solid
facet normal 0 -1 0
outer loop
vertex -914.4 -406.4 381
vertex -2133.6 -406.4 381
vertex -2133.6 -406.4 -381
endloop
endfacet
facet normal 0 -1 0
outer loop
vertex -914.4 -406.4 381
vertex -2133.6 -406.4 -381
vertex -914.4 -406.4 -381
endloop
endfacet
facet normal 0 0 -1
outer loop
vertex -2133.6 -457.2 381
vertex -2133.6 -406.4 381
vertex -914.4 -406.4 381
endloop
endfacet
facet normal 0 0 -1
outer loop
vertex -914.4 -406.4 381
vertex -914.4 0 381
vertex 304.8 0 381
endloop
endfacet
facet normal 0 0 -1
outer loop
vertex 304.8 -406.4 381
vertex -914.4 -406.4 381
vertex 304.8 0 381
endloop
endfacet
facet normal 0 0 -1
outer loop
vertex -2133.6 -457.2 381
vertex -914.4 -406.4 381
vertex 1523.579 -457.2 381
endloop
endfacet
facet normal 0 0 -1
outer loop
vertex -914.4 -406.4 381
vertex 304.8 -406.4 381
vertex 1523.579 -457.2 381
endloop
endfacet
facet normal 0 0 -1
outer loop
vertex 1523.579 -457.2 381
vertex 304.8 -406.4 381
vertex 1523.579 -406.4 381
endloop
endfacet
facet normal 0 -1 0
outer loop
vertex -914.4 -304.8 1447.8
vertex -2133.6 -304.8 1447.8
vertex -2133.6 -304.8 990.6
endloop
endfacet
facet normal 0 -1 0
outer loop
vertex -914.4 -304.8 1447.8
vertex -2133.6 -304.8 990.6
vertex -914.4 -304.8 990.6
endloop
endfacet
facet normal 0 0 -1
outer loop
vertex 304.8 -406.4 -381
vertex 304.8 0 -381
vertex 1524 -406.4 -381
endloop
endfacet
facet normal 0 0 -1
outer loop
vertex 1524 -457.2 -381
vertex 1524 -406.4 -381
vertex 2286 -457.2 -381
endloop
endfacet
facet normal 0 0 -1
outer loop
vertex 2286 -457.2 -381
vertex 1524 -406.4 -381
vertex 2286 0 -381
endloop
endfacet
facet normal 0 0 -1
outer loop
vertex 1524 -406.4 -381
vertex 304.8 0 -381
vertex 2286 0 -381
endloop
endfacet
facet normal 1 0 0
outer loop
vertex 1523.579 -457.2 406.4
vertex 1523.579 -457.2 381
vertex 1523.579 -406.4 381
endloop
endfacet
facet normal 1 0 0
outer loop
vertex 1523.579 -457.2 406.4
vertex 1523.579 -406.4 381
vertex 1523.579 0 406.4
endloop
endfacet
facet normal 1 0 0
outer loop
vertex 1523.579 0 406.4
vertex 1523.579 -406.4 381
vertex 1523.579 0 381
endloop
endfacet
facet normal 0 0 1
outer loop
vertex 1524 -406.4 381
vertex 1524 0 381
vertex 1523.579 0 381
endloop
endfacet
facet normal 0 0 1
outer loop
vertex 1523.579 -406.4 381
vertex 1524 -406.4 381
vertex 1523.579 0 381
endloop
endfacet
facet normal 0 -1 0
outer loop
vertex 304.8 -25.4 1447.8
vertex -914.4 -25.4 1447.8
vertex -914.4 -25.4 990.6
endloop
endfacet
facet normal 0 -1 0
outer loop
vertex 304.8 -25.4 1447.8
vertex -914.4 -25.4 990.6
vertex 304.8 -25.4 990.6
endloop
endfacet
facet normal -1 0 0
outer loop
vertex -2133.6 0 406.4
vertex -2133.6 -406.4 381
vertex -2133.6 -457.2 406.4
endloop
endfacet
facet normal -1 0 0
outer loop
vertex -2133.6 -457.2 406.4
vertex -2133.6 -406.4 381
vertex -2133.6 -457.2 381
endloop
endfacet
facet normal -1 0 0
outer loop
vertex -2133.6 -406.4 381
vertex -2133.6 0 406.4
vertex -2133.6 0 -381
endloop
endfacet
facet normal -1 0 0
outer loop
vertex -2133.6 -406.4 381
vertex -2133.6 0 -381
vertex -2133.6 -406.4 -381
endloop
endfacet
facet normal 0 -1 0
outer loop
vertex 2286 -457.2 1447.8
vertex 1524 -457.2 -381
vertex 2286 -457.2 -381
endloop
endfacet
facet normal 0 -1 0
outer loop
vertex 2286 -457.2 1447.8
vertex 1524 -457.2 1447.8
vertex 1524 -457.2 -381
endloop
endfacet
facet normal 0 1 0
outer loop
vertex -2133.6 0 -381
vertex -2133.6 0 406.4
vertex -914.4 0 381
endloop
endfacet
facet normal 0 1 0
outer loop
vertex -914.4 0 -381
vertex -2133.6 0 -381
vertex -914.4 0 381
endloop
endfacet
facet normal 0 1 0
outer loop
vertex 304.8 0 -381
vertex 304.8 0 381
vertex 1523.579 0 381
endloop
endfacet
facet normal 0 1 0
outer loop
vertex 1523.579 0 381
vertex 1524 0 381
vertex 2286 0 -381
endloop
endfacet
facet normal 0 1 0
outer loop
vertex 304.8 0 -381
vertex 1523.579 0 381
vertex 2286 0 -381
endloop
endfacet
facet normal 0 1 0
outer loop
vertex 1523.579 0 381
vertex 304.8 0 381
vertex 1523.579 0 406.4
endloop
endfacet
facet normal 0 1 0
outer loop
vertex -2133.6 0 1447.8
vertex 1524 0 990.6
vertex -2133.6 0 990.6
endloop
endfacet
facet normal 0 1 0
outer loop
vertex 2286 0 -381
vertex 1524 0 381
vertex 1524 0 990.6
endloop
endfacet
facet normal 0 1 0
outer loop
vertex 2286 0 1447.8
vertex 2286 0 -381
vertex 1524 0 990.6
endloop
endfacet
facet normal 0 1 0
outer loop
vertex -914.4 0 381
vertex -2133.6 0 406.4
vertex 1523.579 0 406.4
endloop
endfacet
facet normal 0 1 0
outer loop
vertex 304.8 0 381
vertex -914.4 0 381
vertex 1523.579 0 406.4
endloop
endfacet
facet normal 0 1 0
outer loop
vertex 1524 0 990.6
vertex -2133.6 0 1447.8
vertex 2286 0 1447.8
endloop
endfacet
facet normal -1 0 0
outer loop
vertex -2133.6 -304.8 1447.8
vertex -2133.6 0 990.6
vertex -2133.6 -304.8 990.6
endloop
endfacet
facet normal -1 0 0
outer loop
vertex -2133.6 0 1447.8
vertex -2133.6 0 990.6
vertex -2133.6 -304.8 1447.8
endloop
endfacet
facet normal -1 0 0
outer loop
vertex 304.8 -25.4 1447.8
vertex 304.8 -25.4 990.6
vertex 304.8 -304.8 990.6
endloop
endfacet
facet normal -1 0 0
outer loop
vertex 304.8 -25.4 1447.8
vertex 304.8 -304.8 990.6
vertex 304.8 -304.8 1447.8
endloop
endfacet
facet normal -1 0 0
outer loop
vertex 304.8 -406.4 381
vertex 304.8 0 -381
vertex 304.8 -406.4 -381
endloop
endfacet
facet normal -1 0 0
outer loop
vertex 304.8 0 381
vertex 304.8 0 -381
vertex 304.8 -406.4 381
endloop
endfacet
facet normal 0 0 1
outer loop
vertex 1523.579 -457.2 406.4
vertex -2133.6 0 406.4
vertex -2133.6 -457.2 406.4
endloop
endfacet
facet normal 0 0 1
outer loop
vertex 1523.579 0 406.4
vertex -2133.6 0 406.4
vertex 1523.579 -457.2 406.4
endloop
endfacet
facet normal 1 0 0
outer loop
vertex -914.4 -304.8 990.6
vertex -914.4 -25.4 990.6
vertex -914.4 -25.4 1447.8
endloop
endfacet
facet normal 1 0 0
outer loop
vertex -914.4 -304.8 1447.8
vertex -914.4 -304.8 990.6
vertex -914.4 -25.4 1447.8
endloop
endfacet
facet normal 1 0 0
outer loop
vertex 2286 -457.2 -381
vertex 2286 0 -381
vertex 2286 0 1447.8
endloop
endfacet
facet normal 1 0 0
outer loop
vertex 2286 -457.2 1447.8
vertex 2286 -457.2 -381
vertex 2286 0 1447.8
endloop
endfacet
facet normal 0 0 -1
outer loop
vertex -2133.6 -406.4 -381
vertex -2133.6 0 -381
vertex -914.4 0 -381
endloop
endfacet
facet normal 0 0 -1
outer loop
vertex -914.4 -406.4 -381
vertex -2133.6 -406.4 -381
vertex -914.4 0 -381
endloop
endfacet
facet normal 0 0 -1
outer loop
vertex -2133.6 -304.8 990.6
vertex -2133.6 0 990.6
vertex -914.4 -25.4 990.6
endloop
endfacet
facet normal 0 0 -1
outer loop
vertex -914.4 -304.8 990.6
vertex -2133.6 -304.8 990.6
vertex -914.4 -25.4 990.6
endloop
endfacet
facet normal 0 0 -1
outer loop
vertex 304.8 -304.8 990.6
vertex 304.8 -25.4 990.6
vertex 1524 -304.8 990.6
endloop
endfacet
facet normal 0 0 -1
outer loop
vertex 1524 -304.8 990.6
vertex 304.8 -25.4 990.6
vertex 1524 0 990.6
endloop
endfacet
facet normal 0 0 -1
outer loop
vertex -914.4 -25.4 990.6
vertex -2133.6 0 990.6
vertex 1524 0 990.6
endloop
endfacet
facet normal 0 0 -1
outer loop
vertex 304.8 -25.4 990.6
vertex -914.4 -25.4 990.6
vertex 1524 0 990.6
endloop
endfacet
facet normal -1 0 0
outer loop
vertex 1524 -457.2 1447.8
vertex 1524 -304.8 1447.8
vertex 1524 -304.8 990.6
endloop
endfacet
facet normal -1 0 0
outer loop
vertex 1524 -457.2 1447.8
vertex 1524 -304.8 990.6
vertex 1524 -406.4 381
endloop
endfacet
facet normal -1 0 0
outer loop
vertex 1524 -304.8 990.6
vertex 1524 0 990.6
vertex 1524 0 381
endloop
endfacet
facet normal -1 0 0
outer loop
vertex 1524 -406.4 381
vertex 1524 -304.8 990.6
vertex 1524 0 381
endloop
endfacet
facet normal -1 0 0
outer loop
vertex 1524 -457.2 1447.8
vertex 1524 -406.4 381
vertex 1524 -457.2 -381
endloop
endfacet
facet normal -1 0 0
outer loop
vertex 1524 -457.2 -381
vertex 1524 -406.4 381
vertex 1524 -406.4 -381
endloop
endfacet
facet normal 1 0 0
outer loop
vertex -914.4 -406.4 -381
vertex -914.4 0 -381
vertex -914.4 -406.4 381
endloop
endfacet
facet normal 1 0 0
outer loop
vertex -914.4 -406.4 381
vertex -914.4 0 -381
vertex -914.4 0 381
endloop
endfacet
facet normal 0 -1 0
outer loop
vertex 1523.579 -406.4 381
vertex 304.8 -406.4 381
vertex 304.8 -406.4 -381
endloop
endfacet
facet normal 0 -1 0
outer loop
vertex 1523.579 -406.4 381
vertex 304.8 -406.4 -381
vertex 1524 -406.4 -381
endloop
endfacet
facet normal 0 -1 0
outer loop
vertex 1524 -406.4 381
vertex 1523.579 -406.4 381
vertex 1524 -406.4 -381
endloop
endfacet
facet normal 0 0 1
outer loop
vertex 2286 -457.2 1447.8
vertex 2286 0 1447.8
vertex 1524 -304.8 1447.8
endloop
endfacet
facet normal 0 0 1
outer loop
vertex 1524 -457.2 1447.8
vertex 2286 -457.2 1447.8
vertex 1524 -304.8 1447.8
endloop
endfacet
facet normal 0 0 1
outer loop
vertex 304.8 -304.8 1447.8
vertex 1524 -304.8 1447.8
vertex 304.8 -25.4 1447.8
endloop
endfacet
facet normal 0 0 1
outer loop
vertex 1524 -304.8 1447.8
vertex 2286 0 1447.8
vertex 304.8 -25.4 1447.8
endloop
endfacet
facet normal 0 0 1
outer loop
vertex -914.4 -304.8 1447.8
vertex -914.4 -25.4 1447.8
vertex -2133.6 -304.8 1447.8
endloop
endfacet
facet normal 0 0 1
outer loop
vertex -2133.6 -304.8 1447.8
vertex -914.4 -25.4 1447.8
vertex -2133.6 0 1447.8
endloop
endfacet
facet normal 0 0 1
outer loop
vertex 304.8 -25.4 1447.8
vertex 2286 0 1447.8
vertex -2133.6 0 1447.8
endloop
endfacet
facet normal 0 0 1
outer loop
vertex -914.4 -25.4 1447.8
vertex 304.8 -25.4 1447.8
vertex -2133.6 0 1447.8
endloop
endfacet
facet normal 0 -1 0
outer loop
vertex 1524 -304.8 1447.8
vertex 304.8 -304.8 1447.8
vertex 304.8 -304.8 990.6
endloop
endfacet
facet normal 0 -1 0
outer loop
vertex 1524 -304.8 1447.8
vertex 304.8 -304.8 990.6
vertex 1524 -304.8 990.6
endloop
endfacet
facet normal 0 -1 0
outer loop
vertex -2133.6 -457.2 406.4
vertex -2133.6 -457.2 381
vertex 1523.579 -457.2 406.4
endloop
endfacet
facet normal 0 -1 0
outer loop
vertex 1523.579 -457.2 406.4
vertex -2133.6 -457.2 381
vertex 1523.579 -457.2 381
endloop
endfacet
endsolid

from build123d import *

# Parameters (mm, degrees)
F0_W     = 609.6
F0_H     = 762
F1_DEPTH = 406.4
F2_DEPTH = 457.2
F0_H_2   = 457.2
F3_DEPTH = 304.8
F4_W     = 1219.2
F4_H     = 406.4
F5_DEPTH = 25.4
F6_DEPTH = 25.4


with BuildPart() as f1:
    # F0 (on Front) → F1 (new body)
    with BuildSketch(Plane.XZ):
        with Locations((609.6, 0)):
            Rectangle(F0_W, F0_H)
        with Locations((1219.2, 0)):
            Rectangle(F0_W, F0_H)
    extrude(amount=F1_DEPTH)

    # F0 (on Front) → F2 (join)
    with BuildSketch(Plane.XZ):
        Polygon((1524, 381), (1524, -381), (2286, -381), (2286, 1447.8), (1524, 1447.8), (1524, 990.6), align=None)
    extrude(amount=F2_DEPTH)

    # F0 (on Front) → F3, piece 2 (join)
    with BuildSketch(Plane.XZ):
        with Locations((609.6, 1219.2)):
            Rectangle(F0_W, F0_H_2)
        with Locations((1219.2, 1219.2)):
            Rectangle(F0_W, F0_H_2)
    extrude(amount=F3_DEPTH)



with BuildPart() as f1b:
    # F0 (on Front) → F1, piece 2 (new body)
    with BuildSketch(Plane.XZ):
        with Locations((-1828.8, 0)):
            Rectangle(F0_W, F0_H)
        with Locations((-1219.2, 0)):
            Rectangle(F0_W, F0_H)
    extrude(amount=F1_DEPTH)


with BuildPart() as f3:
    # F0 (on Front) → F3 (new body)
    with BuildSketch(Plane.XZ):
        with Locations((-1219.2, 1219.2)):
            Rectangle(F0_W, F0_H_2)
        with Locations((-1828.8, 1219.2)):
            Rectangle(F0_W, F0_H_2)
    extrude(amount=F3_DEPTH)


with BuildPart() as f1_1:
    add(f1.part)

    add(f1b.part)  # F5 merges F1b
    # F4 (on face) → F5 (join)
    with BuildSketch(Plane.XY.offset(381)):
        Polygon((1523.5787630081, -457.2), (1523.5787630081, 0), (-914.4, 0), (-914.4, -406.4), (-2133.6, -406.4), (-2133.6, -457.2), align=None)
        with Locations((-1524, -203.2)):
            Rectangle(F4_W, F4_H)
    extrude(amount=F5_DEPTH)


    add(f3.part)  # F6 merges F3
    # F0 (on Front) → F6 (join)
    with BuildSketch(Plane.XZ):
        with Locations((0, 1219.2)):
            Rectangle(F0_W, F0_H_2)
        with Locations((-609.6, 1219.2)):
            Rectangle(F0_W, F0_H_2)
    extrude(amount=F6_DEPTH)


solid = f1_1.part
